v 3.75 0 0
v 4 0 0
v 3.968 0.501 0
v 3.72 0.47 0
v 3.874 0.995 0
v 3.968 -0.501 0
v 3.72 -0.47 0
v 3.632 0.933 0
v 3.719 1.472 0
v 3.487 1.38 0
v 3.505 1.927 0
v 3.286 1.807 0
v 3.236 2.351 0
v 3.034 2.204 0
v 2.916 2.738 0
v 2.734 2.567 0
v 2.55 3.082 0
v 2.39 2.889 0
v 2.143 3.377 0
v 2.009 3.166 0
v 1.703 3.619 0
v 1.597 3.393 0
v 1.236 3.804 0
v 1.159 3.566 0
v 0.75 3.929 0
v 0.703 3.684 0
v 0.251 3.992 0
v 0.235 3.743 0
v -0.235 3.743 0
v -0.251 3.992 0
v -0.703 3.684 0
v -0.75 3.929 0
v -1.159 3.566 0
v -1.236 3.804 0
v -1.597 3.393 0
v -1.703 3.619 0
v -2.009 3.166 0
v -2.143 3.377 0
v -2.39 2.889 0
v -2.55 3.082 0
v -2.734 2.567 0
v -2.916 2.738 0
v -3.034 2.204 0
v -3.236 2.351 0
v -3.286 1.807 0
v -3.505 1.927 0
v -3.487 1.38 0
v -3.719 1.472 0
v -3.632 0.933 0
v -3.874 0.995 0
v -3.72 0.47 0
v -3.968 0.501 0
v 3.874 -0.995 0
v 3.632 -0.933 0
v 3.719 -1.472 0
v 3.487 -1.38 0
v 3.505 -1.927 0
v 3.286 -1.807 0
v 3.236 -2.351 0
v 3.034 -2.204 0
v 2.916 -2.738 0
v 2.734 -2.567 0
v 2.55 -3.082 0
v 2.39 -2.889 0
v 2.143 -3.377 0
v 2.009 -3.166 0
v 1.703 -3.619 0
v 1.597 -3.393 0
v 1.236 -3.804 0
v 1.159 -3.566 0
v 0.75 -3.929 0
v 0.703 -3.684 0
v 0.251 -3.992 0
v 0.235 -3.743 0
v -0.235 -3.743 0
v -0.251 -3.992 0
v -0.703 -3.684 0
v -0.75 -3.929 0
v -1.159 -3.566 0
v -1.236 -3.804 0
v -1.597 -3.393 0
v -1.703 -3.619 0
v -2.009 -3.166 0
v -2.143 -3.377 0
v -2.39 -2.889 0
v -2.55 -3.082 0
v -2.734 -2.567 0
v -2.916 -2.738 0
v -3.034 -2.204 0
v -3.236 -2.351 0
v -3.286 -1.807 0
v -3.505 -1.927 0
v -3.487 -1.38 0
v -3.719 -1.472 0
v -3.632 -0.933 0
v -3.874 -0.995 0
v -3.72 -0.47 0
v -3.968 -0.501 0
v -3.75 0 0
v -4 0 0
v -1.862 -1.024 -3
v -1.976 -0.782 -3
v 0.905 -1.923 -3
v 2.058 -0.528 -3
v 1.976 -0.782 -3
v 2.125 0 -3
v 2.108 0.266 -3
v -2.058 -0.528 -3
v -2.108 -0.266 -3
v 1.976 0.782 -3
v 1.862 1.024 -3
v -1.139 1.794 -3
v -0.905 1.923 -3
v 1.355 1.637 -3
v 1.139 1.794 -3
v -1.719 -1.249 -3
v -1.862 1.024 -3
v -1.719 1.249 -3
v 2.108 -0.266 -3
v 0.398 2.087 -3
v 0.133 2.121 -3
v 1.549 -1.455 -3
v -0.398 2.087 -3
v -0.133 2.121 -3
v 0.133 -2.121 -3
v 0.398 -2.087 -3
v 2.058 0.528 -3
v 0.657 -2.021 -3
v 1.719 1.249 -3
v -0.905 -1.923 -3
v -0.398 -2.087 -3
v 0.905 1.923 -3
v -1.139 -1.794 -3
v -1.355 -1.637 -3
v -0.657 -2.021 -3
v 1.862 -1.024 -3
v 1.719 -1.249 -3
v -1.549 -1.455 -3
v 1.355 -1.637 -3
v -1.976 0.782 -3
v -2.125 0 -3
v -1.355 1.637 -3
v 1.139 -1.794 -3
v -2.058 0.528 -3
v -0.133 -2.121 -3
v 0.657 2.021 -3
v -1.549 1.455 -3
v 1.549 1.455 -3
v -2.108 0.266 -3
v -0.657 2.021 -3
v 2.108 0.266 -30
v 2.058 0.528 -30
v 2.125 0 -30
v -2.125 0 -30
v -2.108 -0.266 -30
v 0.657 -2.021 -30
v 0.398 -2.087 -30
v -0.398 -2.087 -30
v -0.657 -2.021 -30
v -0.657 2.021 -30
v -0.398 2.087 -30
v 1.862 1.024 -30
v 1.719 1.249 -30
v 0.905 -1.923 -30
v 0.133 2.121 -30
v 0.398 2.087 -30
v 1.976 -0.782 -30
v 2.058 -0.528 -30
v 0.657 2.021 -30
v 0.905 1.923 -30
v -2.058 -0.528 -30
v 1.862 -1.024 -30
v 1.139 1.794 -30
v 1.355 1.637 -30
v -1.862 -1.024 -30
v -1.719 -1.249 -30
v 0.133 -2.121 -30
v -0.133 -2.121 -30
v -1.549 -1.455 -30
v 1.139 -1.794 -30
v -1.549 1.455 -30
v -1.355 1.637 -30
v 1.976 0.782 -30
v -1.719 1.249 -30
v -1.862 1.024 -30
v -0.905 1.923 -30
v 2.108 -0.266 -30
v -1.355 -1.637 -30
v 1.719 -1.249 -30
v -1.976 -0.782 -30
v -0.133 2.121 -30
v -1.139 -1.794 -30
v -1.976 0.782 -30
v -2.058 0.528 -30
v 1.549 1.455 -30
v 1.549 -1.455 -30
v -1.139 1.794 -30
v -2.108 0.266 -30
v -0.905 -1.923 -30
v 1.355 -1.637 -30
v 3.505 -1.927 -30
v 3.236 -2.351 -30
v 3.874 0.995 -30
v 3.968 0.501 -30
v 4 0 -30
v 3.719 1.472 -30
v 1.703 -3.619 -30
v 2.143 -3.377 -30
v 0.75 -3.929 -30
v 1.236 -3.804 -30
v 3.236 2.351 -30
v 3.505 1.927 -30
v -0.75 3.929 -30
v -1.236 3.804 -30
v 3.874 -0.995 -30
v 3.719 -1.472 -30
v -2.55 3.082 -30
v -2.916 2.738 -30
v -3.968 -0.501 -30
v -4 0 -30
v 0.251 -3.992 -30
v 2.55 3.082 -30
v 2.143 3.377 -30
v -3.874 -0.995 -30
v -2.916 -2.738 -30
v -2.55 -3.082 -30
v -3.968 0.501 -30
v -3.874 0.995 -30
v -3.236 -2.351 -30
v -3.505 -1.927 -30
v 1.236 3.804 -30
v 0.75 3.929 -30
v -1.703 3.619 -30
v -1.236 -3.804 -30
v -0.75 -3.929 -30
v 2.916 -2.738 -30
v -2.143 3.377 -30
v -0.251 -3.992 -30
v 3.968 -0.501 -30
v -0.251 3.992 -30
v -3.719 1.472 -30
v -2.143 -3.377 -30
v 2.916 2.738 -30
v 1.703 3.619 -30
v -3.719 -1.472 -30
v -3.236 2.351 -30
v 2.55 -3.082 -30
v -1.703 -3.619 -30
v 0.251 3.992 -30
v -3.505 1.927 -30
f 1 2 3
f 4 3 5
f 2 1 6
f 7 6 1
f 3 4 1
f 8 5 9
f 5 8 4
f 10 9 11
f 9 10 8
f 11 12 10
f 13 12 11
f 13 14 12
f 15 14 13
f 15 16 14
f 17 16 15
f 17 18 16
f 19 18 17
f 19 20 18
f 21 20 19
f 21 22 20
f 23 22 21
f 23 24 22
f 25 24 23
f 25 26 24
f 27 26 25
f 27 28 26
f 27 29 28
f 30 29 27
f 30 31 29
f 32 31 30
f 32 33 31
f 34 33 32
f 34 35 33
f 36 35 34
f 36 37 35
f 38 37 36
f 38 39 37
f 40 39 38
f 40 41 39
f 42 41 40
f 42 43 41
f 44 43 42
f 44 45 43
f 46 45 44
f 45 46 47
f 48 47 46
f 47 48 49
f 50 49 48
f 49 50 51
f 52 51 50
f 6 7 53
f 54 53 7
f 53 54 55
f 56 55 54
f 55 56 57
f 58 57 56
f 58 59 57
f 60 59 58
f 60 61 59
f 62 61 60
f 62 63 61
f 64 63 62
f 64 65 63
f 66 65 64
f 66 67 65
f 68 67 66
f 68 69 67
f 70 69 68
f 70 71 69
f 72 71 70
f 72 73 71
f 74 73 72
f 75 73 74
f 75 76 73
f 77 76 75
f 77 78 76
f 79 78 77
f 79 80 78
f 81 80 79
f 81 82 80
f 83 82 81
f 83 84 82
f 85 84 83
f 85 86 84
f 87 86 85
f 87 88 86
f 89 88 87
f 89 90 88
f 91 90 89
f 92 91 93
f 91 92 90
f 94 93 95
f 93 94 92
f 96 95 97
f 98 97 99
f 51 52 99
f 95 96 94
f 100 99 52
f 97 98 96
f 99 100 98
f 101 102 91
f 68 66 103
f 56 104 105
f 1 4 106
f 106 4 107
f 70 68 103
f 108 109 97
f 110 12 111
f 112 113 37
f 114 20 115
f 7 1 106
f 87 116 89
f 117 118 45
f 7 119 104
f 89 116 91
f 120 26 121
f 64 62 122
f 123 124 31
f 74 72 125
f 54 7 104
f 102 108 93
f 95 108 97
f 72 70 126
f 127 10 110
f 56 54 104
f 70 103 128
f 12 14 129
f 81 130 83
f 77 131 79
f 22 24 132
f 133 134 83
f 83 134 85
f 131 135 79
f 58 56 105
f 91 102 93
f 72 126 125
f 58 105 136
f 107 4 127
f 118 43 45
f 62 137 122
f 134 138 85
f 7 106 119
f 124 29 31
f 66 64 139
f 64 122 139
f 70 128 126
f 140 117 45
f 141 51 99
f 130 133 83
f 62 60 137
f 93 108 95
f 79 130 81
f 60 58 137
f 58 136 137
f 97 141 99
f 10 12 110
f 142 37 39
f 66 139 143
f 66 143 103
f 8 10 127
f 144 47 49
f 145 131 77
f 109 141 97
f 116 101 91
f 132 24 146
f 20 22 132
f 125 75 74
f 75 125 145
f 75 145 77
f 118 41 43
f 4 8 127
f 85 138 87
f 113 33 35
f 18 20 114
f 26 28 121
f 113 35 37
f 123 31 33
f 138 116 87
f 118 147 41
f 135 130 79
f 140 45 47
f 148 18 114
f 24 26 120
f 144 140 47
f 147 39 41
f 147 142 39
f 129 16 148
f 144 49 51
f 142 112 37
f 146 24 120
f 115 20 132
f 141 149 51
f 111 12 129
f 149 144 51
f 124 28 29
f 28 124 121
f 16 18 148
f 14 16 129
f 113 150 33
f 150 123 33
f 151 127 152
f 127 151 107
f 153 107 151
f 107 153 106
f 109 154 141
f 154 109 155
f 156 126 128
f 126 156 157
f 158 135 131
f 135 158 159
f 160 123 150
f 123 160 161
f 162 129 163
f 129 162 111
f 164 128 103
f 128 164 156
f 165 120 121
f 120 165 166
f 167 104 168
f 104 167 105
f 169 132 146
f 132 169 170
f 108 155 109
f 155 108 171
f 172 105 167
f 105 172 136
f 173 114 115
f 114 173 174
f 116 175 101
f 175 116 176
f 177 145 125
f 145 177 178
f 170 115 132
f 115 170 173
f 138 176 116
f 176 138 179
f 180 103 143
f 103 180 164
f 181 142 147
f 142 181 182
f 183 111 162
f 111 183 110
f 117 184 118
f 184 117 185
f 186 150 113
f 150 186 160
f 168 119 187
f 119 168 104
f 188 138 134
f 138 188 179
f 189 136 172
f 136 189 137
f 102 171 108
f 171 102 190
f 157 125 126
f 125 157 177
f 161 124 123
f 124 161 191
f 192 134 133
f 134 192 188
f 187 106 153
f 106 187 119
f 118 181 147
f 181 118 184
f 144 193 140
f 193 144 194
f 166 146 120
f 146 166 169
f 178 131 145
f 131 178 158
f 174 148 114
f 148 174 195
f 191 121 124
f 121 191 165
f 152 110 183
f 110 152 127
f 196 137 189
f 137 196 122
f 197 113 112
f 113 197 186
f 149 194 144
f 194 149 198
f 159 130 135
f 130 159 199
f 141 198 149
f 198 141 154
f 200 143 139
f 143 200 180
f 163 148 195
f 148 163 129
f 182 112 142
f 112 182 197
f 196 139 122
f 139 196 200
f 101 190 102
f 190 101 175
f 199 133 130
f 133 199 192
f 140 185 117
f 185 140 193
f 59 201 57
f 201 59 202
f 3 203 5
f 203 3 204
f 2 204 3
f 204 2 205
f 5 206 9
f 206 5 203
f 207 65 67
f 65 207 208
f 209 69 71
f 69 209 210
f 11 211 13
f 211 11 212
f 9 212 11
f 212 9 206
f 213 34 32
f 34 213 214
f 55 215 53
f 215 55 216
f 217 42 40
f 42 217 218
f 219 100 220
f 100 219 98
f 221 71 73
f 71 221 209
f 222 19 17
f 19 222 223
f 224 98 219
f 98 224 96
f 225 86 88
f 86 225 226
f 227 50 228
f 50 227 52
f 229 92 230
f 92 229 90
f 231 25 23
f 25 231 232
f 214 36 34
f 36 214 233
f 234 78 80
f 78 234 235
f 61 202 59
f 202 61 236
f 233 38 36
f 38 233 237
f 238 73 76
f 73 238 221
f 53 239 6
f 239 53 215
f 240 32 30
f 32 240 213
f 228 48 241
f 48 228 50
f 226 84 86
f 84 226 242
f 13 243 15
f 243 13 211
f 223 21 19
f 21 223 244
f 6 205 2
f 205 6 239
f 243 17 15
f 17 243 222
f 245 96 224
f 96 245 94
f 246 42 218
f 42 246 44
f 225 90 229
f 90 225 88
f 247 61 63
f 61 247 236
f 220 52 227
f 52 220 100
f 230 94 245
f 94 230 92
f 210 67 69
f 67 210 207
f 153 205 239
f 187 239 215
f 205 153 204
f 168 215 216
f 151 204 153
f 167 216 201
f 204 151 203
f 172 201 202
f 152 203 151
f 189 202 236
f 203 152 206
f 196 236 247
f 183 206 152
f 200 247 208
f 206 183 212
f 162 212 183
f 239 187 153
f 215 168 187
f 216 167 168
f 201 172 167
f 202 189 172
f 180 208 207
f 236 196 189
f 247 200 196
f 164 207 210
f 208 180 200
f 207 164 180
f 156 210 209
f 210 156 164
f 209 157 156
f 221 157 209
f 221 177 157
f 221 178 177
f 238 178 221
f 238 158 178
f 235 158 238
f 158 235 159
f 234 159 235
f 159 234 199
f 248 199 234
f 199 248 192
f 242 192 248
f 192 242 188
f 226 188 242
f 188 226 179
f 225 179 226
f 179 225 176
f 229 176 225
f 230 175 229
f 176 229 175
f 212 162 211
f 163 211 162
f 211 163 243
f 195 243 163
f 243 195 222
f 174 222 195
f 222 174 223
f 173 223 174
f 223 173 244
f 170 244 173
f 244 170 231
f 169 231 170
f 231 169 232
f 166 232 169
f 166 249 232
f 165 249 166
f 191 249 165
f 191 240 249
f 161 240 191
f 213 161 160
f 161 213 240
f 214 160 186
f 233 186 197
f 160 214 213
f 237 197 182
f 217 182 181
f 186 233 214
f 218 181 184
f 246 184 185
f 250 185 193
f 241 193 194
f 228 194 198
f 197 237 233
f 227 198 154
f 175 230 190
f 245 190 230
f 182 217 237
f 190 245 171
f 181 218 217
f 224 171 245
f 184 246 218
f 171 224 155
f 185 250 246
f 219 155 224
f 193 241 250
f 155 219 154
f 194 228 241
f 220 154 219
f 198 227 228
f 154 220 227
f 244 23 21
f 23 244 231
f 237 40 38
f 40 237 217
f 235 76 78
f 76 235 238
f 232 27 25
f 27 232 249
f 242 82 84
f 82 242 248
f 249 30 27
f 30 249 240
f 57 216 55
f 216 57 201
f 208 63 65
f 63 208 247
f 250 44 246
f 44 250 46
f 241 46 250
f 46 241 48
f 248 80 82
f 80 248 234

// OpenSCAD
$fn = 50;

difference() {
	union() {
		translate(v = [0, 0, -30.0]) {
			cylinder(h = 30, r = 4.0);
		}
	}
	union() {
		translate(v = [0, 0, 0]) {
			rotate(a = [0, 0, 0]) {
				difference() {
					union() {
						translate(v = [0, 0, -33.0]) {
							cylinder(h = 33, r = 2.0);
						}
						translate(v = [0, 0, -3]) {
							cylinder(h = 3, r1 = 2.125, r2 = 3.75);
						}
						translate(v = [0, 0, -33.0]) {
							cylinder(h = 33, r = 2.125);
						}
						translate(v = [0, 0, -33.0]) {
							cylinder(h = 33, r = 2.0);
						}
					}
					union();
				}
			}
		}
	}
}
